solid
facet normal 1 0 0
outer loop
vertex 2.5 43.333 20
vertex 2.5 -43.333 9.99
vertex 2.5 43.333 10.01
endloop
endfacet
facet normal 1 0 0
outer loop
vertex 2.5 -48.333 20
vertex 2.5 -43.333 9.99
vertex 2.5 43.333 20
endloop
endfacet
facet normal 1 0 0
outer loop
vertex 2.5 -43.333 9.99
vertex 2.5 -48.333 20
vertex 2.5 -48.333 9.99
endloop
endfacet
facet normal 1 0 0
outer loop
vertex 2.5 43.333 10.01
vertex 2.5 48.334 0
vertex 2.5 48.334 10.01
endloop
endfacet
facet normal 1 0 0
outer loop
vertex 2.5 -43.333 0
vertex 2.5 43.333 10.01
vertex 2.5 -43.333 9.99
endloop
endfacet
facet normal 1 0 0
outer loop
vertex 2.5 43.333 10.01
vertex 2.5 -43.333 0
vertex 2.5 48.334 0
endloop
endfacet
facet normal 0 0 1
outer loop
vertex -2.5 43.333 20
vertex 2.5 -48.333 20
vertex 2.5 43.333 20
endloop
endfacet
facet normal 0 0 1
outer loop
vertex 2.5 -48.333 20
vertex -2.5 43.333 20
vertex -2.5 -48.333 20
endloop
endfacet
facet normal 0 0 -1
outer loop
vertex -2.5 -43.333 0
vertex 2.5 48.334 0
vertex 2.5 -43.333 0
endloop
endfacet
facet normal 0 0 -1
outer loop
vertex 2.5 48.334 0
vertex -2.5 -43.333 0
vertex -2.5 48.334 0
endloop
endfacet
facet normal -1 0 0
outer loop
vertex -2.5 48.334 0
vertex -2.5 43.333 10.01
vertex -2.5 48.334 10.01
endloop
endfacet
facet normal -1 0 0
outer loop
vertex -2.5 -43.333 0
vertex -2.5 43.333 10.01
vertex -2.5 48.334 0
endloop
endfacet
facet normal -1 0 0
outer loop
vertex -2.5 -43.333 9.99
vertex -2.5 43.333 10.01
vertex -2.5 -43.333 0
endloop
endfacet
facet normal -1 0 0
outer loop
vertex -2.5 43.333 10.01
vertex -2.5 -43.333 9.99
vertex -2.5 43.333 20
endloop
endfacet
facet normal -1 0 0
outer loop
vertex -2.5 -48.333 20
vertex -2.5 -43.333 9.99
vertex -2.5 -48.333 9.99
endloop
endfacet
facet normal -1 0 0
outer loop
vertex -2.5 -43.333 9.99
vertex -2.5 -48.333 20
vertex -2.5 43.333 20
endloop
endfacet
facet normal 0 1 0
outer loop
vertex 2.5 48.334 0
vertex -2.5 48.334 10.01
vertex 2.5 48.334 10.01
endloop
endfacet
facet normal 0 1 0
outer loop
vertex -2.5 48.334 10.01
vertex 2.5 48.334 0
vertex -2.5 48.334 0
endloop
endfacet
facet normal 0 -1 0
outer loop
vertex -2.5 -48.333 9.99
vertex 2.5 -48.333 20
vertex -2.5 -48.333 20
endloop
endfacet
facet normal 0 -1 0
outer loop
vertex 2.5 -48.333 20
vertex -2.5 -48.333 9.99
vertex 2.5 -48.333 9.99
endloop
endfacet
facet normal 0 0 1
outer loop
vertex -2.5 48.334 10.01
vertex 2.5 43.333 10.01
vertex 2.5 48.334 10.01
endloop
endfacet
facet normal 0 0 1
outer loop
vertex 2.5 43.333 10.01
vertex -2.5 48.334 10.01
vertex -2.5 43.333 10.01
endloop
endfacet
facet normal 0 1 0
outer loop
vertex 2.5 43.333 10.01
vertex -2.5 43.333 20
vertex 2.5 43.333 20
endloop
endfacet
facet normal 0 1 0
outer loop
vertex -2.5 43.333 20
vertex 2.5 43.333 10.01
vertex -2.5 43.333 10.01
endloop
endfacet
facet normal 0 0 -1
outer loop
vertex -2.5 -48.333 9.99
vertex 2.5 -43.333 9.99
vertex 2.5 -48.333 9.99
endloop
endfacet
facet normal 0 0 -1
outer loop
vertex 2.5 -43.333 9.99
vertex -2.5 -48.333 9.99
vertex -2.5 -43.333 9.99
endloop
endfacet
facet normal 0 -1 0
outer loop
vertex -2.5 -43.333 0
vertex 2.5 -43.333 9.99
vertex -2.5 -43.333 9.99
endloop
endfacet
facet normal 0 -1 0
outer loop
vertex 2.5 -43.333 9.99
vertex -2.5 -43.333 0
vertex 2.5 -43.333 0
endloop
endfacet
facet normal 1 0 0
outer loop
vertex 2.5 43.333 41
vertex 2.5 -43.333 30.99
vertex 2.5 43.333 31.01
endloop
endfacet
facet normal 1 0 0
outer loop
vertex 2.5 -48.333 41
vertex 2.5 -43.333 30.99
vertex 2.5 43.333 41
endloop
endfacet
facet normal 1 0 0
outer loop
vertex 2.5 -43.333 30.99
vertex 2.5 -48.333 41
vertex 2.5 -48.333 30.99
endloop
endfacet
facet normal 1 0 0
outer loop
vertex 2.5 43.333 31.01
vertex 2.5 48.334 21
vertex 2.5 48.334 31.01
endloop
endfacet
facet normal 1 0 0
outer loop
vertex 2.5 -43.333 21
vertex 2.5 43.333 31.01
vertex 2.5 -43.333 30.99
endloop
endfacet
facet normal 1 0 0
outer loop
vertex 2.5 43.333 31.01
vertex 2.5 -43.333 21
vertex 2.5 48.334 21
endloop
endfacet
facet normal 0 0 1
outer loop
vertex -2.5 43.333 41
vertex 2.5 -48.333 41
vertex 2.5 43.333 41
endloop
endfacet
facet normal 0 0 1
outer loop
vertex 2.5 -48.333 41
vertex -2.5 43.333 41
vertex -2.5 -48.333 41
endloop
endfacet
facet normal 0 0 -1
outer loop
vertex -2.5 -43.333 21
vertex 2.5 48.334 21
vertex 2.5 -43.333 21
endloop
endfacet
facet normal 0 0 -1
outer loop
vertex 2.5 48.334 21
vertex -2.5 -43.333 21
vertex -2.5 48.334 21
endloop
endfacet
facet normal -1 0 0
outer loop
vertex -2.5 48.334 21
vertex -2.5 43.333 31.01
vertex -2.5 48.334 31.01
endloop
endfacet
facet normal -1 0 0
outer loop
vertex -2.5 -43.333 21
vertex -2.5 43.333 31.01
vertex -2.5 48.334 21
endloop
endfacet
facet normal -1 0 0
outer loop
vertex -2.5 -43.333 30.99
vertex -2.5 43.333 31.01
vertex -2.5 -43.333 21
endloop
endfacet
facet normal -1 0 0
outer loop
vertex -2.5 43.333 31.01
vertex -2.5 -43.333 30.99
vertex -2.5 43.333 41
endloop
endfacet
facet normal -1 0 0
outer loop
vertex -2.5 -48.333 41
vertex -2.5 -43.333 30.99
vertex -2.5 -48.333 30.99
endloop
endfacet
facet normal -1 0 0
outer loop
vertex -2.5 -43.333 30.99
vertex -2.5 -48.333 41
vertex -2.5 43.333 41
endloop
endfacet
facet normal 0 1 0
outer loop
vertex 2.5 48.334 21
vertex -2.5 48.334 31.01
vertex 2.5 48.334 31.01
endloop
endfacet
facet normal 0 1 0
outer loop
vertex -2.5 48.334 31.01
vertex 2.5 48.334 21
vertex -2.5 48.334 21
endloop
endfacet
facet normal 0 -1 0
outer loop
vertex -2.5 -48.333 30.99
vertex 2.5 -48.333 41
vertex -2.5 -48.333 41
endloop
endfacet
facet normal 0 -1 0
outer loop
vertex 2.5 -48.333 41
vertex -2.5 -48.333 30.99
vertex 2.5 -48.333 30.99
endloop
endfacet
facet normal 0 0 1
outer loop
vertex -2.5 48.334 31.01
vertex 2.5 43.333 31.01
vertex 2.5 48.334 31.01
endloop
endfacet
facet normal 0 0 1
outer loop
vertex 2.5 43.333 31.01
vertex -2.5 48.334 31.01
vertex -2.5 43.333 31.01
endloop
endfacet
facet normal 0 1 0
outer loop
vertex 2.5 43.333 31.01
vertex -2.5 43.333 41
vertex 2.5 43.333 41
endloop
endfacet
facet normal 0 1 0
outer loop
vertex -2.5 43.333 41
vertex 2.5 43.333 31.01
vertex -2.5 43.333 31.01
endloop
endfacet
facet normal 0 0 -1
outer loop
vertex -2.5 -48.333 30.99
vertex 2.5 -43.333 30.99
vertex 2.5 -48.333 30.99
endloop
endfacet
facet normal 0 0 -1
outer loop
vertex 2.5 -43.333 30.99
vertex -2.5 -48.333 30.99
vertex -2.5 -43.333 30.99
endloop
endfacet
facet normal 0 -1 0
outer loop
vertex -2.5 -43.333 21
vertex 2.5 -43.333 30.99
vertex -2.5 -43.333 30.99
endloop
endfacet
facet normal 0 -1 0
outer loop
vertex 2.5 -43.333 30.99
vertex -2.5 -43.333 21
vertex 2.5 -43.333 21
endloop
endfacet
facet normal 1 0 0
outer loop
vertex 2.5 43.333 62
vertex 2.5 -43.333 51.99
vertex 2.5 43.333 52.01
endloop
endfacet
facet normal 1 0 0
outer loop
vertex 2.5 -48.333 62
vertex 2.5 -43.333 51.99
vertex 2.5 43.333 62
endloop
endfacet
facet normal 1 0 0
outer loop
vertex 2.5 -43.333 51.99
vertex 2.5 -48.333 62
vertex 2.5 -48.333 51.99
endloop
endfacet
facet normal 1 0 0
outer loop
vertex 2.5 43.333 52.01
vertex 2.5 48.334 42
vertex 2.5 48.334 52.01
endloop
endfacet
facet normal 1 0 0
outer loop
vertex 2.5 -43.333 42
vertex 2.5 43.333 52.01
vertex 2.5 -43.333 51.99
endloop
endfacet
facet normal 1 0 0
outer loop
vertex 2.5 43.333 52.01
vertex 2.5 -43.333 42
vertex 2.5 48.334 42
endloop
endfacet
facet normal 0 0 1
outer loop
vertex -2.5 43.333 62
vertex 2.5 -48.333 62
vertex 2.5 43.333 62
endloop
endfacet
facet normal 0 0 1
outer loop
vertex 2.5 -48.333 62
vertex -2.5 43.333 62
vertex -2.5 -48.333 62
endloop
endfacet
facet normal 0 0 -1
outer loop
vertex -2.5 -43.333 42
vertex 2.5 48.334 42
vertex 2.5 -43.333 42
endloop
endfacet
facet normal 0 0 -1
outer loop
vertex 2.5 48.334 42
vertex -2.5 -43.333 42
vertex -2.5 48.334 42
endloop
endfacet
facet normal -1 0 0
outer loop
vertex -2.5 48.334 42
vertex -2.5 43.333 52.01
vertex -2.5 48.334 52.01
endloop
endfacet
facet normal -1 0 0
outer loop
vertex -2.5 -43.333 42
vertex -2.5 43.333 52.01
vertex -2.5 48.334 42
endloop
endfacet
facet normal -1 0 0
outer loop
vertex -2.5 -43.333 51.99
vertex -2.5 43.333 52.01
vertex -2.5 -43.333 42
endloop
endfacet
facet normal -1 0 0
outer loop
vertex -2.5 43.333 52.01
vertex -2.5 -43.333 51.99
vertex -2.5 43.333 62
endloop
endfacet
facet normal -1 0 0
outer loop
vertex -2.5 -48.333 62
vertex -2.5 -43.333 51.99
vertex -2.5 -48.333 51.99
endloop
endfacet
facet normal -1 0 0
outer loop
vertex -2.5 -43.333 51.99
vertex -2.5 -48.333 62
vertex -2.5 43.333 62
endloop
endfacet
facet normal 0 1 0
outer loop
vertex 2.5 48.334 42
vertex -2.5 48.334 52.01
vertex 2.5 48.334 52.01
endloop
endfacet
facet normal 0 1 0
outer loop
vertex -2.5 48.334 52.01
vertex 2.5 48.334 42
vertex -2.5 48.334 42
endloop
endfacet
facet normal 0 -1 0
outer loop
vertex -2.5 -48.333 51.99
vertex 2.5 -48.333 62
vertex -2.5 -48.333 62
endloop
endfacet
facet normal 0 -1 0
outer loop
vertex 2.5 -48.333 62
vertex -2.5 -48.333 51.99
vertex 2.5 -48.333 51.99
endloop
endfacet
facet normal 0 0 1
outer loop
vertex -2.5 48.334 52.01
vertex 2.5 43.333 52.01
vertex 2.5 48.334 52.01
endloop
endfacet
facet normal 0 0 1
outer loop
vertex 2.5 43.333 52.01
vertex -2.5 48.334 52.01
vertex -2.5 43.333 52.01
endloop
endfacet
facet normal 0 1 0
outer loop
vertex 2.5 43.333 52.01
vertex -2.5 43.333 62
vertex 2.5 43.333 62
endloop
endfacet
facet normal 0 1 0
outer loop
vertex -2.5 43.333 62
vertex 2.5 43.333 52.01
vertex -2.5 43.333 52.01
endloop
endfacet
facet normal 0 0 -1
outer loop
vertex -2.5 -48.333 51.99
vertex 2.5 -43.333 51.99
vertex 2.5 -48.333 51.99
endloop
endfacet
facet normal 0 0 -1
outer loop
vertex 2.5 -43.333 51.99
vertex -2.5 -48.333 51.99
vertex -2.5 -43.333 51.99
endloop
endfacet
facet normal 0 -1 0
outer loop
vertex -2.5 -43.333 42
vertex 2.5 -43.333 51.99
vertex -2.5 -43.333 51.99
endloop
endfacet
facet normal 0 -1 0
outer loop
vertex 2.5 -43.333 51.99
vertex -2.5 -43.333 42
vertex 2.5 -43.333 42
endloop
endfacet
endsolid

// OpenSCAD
$fn=64;
color("Sienna"){render(){union(){difference(){translate(v = [-2.500, -48.333])
cube(size = [5, 96.667, 20]);
translate(v = [0, 45.933, 10.010])
translate(v = [-3.000, -2.600])
cube(size = [6, 5.200, 10.000]);
translate(v = [0, -45.933, -0.010])
translate(v = [-3.000, -2.600])
cube(size = [6, 5.200, 10.000]);
}
translate(v = [0, 0, 21])
difference(){translate(v = [-2.500, -48.333])
cube(size = [5, 96.667, 20]);
translate(v = [0, 45.933, 10.010])
translate(v = [-3.000, -2.600])
cube(size = [6, 5.200, 10.000]);
translate(v = [0, -45.933, -0.010])
translate(v = [-3.000, -2.600])
cube(size = [6, 5.200, 10.000]);
}
translate(v = [0, 0, 42])
difference(){translate(v = [-2.500, -48.333])
cube(size = [5, 96.667, 20]);
translate(v = [0, 45.933, 10.010])
translate(v = [-3.000, -2.600])
cube(size = [6, 5.200, 10.000]);
translate(v = [0, -45.933, -0.010])
translate(v = [-3.000, -2.600])
cube(size = [6, 5.200, 10.000]);
}
}
}
}
